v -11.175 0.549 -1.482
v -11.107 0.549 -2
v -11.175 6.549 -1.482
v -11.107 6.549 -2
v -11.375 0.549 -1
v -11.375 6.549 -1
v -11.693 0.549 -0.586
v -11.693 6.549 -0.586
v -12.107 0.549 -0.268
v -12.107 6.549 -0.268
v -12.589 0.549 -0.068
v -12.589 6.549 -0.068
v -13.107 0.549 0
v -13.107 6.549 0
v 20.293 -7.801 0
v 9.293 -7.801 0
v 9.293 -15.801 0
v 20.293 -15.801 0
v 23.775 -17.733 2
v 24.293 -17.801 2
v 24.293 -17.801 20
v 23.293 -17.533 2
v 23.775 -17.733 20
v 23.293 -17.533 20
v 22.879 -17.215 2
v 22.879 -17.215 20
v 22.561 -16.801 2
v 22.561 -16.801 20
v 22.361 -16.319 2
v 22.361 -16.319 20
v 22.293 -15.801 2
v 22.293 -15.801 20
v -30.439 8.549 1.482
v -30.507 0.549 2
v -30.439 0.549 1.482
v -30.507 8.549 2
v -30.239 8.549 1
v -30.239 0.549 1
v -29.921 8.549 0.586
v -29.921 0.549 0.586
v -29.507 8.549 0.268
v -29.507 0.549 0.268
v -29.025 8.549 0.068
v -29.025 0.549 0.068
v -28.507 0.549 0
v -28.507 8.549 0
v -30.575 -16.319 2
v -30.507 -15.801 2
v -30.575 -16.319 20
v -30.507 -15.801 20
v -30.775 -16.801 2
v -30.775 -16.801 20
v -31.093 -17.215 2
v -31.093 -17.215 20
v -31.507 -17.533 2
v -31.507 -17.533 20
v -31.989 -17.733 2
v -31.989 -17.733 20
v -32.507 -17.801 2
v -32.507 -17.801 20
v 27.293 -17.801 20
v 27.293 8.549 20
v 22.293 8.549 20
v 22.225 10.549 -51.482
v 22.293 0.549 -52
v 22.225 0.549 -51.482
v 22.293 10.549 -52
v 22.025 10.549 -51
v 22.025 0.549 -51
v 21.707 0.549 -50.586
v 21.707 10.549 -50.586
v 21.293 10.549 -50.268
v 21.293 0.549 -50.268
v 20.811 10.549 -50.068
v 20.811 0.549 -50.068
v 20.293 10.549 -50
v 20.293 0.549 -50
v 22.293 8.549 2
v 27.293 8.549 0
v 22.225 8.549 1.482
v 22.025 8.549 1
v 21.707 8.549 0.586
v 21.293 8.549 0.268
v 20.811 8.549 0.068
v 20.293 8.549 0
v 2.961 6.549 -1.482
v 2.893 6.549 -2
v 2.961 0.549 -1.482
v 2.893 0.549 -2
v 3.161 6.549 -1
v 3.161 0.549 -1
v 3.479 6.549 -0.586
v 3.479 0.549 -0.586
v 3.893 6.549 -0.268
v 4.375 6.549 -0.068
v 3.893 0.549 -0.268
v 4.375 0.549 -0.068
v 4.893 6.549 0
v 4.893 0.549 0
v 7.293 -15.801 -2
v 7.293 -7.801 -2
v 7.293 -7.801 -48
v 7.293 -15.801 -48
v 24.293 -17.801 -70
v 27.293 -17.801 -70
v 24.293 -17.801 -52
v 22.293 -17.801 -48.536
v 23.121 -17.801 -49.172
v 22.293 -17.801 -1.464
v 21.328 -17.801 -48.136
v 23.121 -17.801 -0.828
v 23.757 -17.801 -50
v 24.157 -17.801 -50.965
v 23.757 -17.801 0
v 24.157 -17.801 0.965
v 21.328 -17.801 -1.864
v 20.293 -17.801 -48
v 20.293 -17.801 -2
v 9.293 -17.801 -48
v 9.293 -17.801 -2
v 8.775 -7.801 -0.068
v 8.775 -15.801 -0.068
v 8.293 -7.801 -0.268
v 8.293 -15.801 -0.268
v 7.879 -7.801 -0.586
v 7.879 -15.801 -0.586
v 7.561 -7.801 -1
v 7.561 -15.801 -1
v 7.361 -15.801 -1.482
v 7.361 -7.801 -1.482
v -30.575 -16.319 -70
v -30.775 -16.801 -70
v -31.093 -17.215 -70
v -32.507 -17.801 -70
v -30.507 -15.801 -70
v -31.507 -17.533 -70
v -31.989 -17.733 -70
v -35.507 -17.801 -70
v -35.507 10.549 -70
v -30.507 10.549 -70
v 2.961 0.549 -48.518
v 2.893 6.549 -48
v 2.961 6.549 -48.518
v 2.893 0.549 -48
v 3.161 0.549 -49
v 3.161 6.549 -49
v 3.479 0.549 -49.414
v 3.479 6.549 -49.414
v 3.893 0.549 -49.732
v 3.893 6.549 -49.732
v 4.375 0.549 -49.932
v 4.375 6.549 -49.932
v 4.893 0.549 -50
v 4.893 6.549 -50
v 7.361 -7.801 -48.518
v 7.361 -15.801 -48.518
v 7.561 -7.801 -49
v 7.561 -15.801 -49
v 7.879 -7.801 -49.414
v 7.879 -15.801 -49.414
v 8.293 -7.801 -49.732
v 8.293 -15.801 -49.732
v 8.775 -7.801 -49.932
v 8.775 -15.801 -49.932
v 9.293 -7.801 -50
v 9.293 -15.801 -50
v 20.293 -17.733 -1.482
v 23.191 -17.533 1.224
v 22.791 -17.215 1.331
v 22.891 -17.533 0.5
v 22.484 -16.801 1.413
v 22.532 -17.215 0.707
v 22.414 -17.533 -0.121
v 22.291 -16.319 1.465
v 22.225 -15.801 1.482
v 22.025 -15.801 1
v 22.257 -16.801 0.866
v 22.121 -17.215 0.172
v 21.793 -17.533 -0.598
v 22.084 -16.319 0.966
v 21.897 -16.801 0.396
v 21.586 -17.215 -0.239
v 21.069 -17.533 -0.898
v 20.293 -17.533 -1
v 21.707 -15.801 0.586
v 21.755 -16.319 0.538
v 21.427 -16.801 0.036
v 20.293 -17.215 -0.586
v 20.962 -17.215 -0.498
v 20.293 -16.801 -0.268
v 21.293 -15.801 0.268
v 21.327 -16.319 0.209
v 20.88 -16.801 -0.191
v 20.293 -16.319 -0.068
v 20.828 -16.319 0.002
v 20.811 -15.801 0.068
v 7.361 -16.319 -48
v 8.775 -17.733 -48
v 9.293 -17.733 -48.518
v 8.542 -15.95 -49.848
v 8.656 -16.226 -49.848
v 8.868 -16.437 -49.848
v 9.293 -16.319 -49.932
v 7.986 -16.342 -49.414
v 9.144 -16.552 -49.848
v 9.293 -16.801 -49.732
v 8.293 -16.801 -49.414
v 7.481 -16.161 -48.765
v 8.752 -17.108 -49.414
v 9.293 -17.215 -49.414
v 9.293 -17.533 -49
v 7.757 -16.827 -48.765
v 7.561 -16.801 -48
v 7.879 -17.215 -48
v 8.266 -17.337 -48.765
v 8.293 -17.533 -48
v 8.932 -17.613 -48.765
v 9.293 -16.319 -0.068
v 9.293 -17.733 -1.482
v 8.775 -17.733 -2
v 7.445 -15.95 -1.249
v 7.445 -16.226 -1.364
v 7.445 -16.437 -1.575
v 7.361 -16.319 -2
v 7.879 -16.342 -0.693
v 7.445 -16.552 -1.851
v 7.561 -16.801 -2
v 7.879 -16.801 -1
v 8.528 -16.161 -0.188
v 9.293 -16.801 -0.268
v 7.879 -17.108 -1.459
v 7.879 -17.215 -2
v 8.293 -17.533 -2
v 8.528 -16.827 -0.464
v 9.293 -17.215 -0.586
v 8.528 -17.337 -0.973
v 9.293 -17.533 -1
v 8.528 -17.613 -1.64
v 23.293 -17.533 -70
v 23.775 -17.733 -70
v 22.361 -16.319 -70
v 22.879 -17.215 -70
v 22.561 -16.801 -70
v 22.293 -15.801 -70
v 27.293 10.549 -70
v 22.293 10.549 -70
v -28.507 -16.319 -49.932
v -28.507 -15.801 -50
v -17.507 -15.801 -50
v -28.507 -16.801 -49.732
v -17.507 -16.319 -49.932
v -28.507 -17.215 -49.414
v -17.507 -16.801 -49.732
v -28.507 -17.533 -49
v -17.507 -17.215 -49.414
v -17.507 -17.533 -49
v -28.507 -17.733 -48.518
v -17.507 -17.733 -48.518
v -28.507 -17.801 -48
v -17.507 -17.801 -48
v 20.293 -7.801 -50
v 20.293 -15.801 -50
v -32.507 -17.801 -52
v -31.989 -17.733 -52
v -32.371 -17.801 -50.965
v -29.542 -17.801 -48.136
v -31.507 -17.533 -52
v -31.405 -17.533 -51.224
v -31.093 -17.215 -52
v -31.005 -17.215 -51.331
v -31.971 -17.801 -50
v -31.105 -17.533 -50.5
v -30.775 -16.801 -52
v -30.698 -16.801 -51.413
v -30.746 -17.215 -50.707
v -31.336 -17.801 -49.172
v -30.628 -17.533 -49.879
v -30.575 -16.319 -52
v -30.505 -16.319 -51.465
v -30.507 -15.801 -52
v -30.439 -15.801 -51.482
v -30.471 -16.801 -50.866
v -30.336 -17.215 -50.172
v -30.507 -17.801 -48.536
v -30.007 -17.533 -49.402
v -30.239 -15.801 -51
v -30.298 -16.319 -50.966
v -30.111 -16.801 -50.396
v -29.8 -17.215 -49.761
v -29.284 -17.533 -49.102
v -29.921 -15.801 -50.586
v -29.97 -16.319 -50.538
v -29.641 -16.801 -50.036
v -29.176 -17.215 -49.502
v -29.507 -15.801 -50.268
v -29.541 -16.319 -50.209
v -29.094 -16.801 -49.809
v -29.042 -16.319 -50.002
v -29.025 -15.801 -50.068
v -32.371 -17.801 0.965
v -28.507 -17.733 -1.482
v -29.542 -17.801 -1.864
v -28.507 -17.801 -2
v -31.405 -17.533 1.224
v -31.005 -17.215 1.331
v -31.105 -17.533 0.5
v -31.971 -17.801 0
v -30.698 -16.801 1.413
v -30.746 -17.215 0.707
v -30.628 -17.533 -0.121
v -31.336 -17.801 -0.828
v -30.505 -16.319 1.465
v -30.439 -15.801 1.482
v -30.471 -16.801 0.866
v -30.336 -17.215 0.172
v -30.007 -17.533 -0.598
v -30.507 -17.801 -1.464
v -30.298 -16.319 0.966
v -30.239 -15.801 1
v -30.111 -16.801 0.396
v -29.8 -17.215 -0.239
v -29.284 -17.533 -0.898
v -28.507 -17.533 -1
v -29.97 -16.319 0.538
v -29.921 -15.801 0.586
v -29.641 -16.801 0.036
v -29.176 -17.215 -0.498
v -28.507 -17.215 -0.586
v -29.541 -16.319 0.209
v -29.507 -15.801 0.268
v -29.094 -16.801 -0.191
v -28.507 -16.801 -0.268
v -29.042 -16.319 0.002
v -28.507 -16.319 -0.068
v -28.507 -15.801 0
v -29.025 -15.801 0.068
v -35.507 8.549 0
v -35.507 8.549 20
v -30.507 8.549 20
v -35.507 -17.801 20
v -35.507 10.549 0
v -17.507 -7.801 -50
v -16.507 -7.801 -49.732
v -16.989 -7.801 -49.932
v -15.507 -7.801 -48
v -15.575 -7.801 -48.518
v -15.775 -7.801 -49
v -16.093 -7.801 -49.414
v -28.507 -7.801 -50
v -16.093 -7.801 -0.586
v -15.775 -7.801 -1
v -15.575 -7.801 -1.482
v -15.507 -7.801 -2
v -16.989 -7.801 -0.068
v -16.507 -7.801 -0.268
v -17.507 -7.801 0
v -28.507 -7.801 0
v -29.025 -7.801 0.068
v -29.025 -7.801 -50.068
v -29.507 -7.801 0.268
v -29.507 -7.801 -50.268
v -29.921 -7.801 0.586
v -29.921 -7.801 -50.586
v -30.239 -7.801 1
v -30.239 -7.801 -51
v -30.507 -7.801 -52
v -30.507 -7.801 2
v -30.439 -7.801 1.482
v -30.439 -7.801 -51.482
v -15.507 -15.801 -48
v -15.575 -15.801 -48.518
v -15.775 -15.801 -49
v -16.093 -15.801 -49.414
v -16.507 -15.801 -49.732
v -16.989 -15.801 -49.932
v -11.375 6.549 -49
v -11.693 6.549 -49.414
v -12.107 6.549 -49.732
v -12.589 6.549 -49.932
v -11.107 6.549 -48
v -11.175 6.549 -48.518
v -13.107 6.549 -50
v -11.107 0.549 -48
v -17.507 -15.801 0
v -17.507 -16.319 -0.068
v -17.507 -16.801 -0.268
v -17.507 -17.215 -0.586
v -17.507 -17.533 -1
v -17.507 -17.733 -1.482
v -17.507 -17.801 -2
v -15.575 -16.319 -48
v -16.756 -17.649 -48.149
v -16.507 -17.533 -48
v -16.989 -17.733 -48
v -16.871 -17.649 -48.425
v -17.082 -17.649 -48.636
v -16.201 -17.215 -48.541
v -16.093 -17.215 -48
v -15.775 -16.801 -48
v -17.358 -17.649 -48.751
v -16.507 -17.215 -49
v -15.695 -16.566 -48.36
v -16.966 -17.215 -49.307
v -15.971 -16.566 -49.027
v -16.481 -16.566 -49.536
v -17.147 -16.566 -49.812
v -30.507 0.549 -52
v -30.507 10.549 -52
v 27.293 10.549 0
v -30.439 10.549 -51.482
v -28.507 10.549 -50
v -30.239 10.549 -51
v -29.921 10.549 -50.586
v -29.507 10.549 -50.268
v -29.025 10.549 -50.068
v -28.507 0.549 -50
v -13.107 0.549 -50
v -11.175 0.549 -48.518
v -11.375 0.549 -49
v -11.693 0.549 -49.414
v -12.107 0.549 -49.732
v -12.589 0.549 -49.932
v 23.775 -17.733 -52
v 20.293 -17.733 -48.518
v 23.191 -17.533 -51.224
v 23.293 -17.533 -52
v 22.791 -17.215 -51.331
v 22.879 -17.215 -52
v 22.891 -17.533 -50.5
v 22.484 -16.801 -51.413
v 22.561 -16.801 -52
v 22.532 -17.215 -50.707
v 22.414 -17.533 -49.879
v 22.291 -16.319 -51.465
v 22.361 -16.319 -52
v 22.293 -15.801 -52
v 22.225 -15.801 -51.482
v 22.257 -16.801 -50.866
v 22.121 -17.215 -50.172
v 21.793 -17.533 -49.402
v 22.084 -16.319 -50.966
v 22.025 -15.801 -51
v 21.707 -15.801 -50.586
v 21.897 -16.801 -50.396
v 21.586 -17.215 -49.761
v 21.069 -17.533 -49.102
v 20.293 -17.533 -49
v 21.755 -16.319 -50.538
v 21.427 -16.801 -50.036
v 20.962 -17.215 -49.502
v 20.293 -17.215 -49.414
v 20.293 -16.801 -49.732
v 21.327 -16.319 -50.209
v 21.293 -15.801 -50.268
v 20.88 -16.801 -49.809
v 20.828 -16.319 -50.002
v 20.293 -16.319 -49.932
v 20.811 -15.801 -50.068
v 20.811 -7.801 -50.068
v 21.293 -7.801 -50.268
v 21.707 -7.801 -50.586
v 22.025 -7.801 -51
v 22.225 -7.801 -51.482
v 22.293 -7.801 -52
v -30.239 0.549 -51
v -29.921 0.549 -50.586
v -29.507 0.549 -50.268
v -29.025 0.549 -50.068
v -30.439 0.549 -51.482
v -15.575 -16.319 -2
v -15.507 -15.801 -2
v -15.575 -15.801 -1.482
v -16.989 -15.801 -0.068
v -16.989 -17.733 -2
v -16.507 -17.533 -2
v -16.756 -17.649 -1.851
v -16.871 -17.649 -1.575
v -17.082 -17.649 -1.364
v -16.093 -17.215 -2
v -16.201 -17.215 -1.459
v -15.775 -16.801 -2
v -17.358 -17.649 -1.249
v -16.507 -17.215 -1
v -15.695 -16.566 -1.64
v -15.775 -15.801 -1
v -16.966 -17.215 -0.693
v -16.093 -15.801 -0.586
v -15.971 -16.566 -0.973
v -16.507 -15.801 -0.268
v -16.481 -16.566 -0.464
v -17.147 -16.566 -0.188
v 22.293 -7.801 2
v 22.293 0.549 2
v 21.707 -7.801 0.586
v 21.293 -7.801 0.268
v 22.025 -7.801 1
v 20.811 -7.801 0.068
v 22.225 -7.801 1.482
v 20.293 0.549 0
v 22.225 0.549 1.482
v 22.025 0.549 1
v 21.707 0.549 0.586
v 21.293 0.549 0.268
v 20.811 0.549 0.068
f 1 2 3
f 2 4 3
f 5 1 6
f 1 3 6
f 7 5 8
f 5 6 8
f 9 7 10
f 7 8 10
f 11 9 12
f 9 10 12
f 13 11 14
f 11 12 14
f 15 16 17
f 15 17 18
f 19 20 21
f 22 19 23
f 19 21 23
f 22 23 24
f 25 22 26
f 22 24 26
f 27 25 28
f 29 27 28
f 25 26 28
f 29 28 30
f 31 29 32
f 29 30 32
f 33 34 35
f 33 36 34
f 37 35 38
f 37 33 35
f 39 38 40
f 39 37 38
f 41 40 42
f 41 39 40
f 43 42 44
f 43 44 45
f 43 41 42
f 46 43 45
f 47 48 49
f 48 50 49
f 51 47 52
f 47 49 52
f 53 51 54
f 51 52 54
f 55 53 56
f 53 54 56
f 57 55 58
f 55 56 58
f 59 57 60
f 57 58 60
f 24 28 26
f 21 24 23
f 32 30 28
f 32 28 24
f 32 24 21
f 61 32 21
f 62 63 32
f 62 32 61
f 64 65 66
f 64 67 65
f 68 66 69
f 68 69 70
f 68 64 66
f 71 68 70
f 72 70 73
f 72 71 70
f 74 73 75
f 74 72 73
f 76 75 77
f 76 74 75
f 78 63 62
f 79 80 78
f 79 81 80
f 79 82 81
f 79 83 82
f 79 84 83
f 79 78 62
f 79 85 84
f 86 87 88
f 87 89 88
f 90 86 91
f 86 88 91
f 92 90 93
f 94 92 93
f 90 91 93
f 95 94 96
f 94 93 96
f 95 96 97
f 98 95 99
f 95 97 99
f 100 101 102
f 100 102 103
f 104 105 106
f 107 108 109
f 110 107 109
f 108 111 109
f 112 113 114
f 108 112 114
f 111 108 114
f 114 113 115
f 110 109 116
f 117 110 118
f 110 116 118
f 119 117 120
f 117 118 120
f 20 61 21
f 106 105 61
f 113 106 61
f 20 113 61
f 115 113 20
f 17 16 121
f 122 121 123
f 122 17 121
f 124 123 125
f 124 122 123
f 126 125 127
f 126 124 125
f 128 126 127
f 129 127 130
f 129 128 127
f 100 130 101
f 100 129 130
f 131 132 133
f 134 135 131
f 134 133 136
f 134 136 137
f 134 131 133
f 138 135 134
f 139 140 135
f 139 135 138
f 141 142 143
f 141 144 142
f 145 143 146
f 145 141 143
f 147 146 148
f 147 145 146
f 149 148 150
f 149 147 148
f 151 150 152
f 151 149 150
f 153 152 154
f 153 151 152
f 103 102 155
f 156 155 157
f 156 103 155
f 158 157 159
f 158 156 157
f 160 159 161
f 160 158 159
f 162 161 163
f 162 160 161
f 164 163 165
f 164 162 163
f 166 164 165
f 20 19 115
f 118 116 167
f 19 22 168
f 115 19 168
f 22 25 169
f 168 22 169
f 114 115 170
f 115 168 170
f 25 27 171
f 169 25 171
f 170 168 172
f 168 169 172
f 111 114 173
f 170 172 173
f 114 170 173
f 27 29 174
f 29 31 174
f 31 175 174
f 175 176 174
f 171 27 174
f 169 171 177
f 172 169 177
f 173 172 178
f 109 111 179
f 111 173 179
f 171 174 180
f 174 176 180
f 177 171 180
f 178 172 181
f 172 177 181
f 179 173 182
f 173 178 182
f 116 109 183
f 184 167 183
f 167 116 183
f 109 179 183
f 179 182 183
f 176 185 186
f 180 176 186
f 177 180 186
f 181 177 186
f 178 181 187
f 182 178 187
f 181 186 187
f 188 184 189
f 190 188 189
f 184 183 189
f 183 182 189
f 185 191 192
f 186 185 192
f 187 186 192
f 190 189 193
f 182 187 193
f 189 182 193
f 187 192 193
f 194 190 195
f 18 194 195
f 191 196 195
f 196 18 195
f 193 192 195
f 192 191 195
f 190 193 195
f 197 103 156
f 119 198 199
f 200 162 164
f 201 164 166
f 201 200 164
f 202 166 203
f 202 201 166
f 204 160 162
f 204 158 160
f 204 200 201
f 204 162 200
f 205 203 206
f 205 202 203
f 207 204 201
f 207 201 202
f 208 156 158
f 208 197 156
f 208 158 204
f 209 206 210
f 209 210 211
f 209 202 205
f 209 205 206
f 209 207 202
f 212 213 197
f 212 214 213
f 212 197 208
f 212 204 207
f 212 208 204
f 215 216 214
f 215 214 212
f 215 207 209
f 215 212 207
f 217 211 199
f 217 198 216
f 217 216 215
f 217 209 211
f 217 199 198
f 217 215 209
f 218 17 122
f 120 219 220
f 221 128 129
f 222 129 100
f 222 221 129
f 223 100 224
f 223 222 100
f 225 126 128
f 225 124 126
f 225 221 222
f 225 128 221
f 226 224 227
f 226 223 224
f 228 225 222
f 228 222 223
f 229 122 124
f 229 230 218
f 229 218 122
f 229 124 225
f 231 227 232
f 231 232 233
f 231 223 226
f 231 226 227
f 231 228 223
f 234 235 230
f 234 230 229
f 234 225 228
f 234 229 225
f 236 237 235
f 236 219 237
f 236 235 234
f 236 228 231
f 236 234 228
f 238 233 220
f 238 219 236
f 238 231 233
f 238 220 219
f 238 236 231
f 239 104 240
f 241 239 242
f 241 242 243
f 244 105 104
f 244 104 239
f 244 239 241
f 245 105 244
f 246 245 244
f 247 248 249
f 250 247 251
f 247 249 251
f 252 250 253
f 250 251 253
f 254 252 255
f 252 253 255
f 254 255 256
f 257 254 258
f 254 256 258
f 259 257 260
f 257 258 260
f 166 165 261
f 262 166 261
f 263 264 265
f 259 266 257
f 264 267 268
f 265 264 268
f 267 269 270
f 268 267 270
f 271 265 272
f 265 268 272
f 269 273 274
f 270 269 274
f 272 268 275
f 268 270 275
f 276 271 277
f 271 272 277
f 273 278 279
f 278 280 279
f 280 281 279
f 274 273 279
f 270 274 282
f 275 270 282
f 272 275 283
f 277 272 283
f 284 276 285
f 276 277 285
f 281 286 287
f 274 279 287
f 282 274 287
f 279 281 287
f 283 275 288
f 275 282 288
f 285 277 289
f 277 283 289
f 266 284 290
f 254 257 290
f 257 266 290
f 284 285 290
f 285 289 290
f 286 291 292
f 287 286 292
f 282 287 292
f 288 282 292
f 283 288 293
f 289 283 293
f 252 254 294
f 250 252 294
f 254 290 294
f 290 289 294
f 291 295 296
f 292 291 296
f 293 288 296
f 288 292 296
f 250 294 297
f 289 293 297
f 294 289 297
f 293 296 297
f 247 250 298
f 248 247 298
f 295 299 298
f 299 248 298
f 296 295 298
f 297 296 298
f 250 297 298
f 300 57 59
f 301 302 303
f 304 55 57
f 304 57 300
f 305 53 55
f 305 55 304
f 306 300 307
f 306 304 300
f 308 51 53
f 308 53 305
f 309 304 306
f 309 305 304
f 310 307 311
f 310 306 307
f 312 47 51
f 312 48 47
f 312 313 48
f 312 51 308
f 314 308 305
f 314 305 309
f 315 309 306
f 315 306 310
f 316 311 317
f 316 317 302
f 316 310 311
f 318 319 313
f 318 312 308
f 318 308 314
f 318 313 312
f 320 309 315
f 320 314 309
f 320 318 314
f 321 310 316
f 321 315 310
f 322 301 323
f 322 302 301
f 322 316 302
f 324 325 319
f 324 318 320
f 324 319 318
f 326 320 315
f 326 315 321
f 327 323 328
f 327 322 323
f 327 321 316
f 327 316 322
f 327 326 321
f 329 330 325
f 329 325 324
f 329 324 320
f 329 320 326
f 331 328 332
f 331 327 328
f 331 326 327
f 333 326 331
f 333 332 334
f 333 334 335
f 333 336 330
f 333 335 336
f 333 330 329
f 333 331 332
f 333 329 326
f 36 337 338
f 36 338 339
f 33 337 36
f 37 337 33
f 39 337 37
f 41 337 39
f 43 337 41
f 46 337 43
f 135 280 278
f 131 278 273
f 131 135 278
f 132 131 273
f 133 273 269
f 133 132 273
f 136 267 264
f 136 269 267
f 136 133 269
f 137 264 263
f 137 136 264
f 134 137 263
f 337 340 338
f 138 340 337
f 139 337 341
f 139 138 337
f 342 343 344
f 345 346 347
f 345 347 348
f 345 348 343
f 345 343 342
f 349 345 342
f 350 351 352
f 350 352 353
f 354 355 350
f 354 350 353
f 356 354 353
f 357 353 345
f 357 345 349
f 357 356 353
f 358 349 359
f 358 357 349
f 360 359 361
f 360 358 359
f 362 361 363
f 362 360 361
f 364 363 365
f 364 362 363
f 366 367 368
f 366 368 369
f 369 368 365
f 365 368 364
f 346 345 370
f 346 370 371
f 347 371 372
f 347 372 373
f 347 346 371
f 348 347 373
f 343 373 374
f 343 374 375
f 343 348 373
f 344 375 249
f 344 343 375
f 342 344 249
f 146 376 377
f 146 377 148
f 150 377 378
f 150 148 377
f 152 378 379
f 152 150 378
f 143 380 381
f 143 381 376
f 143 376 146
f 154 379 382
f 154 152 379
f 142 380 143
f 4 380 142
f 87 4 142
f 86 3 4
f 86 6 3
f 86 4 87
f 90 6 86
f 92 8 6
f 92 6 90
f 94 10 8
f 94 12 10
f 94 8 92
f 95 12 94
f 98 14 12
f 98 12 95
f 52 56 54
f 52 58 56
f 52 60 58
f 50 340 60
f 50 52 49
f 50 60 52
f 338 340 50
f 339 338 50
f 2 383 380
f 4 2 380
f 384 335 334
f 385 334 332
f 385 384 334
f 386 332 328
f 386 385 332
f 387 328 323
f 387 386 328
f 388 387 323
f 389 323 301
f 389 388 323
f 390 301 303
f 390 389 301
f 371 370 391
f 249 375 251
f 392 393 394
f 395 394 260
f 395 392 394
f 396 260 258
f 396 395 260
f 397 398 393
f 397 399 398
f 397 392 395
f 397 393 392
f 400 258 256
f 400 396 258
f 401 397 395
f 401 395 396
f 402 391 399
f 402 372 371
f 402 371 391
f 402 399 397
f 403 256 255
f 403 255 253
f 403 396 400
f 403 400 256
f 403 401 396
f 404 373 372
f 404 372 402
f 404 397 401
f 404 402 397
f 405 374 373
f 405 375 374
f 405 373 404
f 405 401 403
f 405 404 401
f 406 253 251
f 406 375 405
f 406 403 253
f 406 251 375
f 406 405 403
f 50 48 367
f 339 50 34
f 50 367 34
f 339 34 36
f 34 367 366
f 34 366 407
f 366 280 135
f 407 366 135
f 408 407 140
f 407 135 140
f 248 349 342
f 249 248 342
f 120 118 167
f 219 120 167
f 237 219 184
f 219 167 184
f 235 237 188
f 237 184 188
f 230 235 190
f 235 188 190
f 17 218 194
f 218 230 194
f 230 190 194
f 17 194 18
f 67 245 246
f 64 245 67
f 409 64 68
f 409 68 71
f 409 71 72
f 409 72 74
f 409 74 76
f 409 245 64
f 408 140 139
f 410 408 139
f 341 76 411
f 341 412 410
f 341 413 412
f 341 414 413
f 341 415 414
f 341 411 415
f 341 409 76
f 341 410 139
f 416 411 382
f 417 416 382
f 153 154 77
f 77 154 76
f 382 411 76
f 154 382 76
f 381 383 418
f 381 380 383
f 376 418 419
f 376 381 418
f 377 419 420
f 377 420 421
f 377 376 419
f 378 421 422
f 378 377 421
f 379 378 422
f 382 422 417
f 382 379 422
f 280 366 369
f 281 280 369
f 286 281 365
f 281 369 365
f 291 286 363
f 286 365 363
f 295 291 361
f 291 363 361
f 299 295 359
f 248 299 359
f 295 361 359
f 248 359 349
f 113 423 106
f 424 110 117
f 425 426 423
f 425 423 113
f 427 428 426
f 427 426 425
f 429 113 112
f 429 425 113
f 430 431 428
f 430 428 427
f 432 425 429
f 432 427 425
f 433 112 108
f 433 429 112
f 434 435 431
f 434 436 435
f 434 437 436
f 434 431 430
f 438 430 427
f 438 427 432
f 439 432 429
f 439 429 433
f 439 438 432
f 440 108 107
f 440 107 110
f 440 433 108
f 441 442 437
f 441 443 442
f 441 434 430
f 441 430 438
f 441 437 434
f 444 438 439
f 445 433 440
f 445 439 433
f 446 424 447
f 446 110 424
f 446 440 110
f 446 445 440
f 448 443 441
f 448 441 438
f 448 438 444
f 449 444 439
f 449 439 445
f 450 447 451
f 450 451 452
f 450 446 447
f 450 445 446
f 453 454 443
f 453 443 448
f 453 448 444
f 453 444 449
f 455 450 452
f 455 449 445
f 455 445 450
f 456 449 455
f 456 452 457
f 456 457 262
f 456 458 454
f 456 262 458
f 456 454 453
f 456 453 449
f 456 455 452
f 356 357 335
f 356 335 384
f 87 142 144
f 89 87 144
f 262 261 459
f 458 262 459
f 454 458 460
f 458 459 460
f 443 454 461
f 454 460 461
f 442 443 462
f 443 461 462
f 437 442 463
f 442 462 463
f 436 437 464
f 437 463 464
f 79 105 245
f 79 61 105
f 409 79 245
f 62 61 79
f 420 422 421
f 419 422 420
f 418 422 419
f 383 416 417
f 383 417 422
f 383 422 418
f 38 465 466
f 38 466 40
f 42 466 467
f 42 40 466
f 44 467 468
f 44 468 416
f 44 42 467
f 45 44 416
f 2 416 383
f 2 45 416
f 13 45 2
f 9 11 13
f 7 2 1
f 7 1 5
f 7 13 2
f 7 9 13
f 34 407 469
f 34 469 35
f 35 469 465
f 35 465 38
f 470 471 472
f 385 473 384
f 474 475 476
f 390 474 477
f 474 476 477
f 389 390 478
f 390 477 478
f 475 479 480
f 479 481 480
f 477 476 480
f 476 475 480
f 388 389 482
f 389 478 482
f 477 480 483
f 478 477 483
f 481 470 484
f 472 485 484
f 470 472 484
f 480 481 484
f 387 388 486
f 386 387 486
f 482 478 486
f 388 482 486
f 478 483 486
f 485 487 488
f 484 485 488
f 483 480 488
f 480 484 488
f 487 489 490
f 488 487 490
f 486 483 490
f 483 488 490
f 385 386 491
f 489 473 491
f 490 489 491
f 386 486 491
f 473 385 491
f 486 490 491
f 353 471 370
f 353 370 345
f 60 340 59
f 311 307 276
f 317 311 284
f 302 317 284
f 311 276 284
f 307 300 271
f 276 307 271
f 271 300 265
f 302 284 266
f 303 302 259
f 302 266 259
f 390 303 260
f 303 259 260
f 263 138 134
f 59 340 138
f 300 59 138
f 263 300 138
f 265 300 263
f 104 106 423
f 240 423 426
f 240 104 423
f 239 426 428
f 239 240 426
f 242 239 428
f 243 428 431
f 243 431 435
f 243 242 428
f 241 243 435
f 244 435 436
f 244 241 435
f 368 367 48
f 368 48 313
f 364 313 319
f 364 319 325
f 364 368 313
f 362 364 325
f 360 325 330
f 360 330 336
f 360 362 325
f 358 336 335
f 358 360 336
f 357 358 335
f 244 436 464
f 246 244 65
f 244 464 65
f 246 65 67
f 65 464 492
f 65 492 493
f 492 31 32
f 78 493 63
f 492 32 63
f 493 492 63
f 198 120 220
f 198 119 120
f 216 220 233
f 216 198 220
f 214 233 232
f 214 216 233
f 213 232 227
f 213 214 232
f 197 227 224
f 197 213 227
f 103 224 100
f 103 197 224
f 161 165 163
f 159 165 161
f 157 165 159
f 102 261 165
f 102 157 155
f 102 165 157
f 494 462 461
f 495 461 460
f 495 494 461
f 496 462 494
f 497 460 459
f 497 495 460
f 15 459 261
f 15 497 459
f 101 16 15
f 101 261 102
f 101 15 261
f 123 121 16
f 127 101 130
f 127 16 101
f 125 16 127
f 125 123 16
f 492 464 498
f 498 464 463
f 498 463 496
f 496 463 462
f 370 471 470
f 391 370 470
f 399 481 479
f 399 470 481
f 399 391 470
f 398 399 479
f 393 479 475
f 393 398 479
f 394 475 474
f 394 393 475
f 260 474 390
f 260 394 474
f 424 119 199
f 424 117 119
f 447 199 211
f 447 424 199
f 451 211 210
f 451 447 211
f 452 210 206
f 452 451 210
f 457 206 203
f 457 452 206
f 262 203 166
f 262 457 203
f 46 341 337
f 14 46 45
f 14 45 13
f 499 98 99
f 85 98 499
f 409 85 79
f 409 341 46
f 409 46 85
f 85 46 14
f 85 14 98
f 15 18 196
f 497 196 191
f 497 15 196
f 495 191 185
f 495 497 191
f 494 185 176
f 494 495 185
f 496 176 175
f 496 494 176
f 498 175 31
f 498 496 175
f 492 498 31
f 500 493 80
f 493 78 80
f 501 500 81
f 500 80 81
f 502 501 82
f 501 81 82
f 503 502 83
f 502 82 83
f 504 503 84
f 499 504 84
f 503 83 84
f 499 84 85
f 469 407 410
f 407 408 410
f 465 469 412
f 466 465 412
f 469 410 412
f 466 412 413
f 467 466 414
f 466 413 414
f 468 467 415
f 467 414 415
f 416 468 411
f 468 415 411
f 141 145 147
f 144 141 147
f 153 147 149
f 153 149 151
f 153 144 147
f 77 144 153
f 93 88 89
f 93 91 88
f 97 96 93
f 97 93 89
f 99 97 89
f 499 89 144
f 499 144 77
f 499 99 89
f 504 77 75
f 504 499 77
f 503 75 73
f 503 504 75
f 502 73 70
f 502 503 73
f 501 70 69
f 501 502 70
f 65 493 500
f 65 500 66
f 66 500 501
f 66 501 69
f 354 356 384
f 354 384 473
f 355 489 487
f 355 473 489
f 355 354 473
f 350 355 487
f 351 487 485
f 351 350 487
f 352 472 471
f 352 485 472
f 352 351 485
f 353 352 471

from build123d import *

# Parameters (mm, degrees)
BOSS_EXTRUDE1_DEPTH = 50
SKETCH2_W           = 5
SKETCH2_H           = 26.35
BOSS_EXTRUDE2_DEPTH = 20
SKETCH4_W           = 5
SKETCH4_H           = 28.35
BOSS_EXTRUDE3_DEPTH = 20
FILLET2_R           = 2


with BuildPart() as part:
    # Sketch1 → Boss-Extrude1 (new body)
    with BuildSketch(Plane.XY):
        Polygon((-35.507131788, 10.549060403), (-35.507131788, -17.800939597), (-15.507131788, -17.800939597), (-15.507131788, -7.800939597), (-30.507131788, -7.800939597), (-30.507131788, 0.549060403), (-11.107131788, 0.549060403), (-11.107131788, 6.549060403), (2.892868212, 6.549060403), (2.892868212, 0.549060403), (22.292868212, 0.549060403), (22.292868212, -7.800939597), (7.292868212, -7.800939597), (7.292868212, -17.800939597), (27.292868212, -17.800939597), (27.292868212, 10.549060403), align=None)
    extrude(amount=-BOSS_EXTRUDE1_DEPTH)

    # Sketch2 → Boss-Extrude2 (add)
    with BuildSketch(Plane.XY):
        with Locations((-33.007131788, -4.625939597)):
            Rectangle(SKETCH2_W, SKETCH2_H)
        with Locations((24.792868212, -4.625939597)):
            Rectangle(SKETCH2_W, SKETCH2_H)
    extrude(amount=BOSS_EXTRUDE2_DEPTH)

    # Sketch4 → Boss-Extrude3 (add)
    with BuildSketch(Plane(origin=(0, 0, -50), x_dir=(-1, 0, 0), z_dir=(0, 0, -1))):
        with Locations((-24.792868212, -3.625939597)):
            Rectangle(SKETCH4_W, SKETCH4_H)
        with Locations((33.007131788, -3.625939597)):
            Rectangle(SKETCH4_W, SKETCH4_H)
    extrude(amount=BOSS_EXTRUDE3_DEPTH)

    # Fillet2
    fillet2_edges = [part.edges().sort_by_distance(p)[0] for p in [
        (14.792868212, -17.800939597, 0),
        (7.292868212, -12.800939597, 0),
        (-15.507131788, -12.800939597, -50),
        (2.892868212, 3.549060403, 0),
        (-11.107131788, 3.549060403, 0),
        (-15.507131788, -12.800939597, 0),
        (7.292868212, -17.800939597, -25),
        (-15.507131788, -17.800939597, -25),
        (-11.107131788, 3.549060403, -50),
        (2.892868212, 3.549060403, -50),
        (-23.007131788, -17.800939597, 0),
        (-30.507131788, -12.800939597, 0),
        (-30.507131788, -17.800939597, 10),
        (-30.507131788, 4.549060403, 0),
        (7.292868212, -12.800939597, -50),
        (22.292868212, 4.549060403, 0),
        (22.292868212, -12.800939597, 0),
        (22.292868212, -17.800939597, 10),
        (14.792868212, -17.800939597, -50),
        (22.292868212, 5.549060403, -50),
        (22.292868212, -12.800939597, -50),
        (22.292868212, -17.800939597, -60),
        (-23.007131788, -17.800939597, -50),
        (-30.507131788, -12.800939597, -50),
        (-30.507131788, 5.549060403, -50),
        (-30.507131788, -17.800939597, -60),
    ]]
    fillet(fillet2_edges, radius=FILLET2_R)


solid = part.part
